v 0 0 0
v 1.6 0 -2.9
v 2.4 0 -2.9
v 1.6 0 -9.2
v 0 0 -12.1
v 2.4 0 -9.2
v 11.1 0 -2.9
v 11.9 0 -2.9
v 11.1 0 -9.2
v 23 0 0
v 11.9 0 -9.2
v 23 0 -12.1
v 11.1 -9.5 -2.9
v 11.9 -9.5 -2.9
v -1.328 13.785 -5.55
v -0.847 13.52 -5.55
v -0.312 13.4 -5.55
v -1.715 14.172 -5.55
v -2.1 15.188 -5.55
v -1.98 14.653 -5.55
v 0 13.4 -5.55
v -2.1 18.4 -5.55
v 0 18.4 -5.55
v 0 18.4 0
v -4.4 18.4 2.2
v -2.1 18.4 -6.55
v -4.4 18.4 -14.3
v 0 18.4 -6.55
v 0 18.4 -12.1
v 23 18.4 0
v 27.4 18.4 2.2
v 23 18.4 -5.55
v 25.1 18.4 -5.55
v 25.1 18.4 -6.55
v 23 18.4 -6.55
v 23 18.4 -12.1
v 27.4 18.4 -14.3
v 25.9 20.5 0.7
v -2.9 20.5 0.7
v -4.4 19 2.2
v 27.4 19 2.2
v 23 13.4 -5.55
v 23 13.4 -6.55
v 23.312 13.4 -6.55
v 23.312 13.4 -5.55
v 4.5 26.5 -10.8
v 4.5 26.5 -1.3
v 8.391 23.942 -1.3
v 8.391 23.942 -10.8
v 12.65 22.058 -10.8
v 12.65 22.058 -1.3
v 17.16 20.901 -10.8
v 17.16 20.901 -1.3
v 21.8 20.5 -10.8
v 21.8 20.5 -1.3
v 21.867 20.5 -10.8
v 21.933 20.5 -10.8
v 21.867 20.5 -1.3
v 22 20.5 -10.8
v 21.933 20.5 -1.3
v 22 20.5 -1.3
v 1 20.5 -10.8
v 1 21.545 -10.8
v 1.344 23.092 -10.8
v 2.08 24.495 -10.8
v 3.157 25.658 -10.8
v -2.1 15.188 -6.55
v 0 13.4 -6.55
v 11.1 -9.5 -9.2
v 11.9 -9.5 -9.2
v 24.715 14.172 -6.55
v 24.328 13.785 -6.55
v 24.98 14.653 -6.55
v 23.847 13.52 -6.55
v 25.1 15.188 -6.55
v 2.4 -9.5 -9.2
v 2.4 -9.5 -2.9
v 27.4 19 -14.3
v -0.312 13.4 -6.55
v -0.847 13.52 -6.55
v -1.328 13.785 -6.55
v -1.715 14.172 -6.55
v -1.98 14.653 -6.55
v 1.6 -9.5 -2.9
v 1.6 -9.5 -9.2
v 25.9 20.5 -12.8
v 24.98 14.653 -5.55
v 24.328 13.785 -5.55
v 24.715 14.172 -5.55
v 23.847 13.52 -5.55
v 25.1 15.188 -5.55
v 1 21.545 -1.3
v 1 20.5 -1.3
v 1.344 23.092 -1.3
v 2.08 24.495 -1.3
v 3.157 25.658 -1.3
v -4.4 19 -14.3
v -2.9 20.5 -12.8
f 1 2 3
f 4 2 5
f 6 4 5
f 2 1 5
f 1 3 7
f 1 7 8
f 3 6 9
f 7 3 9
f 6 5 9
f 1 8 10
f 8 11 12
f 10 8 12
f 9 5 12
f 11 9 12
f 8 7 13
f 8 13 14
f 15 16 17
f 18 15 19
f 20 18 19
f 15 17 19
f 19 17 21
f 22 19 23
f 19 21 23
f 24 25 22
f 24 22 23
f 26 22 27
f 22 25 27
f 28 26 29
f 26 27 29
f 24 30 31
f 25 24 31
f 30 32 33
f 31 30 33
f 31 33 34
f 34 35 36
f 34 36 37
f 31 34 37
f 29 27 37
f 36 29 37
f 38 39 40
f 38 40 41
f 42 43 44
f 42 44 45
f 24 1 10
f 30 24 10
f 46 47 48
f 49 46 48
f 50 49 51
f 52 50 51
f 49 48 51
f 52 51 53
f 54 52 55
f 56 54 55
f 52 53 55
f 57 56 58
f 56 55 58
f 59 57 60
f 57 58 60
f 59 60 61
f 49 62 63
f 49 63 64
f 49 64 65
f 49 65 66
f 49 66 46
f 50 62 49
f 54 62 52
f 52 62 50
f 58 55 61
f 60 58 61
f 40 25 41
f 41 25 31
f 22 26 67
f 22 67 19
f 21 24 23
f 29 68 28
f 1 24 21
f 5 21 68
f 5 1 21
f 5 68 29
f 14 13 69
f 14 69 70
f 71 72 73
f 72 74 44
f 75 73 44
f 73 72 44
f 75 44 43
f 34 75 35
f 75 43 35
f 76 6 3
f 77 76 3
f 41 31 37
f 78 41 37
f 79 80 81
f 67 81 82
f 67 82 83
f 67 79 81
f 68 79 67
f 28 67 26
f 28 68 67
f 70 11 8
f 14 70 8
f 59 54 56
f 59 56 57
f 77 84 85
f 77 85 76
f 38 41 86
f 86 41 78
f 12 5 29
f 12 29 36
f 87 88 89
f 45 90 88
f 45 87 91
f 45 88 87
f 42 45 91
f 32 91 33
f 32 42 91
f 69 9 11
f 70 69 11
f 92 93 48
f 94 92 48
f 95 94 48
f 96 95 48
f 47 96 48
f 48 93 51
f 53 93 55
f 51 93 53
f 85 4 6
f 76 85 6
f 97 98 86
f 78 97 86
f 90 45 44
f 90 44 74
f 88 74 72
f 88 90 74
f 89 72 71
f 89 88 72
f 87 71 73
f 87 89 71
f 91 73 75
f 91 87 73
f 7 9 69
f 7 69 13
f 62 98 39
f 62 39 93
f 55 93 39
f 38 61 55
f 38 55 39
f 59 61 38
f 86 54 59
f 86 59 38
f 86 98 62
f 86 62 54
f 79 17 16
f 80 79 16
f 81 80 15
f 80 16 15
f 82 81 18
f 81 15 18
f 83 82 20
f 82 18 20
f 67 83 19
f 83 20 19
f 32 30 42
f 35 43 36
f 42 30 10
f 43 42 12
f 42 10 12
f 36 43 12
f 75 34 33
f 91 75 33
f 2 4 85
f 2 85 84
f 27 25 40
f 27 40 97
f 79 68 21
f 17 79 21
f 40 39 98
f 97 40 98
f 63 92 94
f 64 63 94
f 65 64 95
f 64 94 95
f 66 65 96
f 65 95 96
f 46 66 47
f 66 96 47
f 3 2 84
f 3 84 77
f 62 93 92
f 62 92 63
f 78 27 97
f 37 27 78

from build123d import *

# Parameters (mm, degrees)
SKETCH1_W           = 23
SKETCH1_H           = 12.1
BOSS_EXTRUDE1_DEPTH = 18.4
SKETCH2_W           = 0.8
SKETCH2_H           = 6.3
BOSS_EXTRUDE2_DEPTH = 9.5
SKETCH3_W           = 31.8
SKETCH3_H           = 16.5
BOSS_EXTRUDE3_DEPTH = 2.1
CHAMFER1_SIZE       = 1.5
SKETCH4_W           = 1
SKETCH4_H           = 5
BOSS_EXTRUDE4_DEPTH = 2.1
CUT_EXTRUDE1_DEPTH  = 1
SKETCH7_W           = 21
SKETCH7_H           = 9.5
BOSS_EXTRUDE5_DEPTH = 6
CUT_EXTRUDE3_DEPTH  = 9.5


with BuildPart() as part:
    # Sketch1 → Boss-Extrude1 (new body)
    with BuildSketch(Plane(origin=(0, 0, 0), x_dir=(1, 0, 0), z_dir=(0, 1, 0))):
        with Locations((11.5, 6.05)):
            Rectangle(SKETCH1_W, SKETCH1_H)
    extrude(amount=BOSS_EXTRUDE1_DEPTH)

    # Sketch2 → Boss-Extrude2 (add)
    with BuildSketch(Plane.XZ):
        with Locations((2, -6.05)):
            Rectangle(SKETCH2_W, SKETCH2_H)
        with Locations((11.5, -6.05)):
            Rectangle(SKETCH2_W, SKETCH2_H)
    extrude(amount=BOSS_EXTRUDE2_DEPTH)

    # Sketch3 → Boss-Extrude3 (add)
    with BuildSketch(Plane(origin=(0, 18.4, 0), x_dir=(1, 0, 0), z_dir=(0, 1, 0))):
        with Locations((11.5, 6.05)):
            Rectangle(SKETCH3_W, SKETCH3_H)
    extrude(amount=BOSS_EXTRUDE3_DEPTH)

    # Chamfer1
    chamfer1_edges = [part.edges().sort_by_distance(p)[0] for p in [
        (-4.4, 20.5, -6.05),
        (11.5, 20.5, 2.2),
        (27.4, 20.5, -6.05),
        (11.5, 20.5, -14.3),
    ]]
    chamfer(chamfer1_edges, length=CHAMFER1_SIZE)

    # Sketch4 → Boss-Extrude4 (add)
    with BuildSketch(Plane.ZY):
        with Locations((-6.05, 15.9)):
            Rectangle(SKETCH4_W, SKETCH4_H)
    boss_extrude4 = extrude(amount=BOSS_EXTRUDE4_DEPTH)

    # Sketch5 → Cut-Extrude1 (cut)
    with BuildSketch(Plane.XY.offset(-5.55)):
        with BuildLine():
            ThreePointArc((-0.312308302, 13.4), (-1.535088668, 13.964911332), (-2.1, 15.187691698))
            Line((-2.1, 15.187691698), (-2.1, 13.4))
            Line((-2.1, 13.4), (-0.312308302, 13.4))
        make_face()
    cut_extrude1 = extrude(amount=-CUT_EXTRUDE1_DEPTH, mode=Mode.SUBTRACT)

    # Mirror2: Boss-Extrude4 across plane
    add(boss_extrude4.mirror(Plane.ZY.offset(-11.5)))

    # Mirror3: Cut-Extrude1 across plane
    add(cut_extrude1.mirror(Plane.ZY.offset(-11.5)), mode=Mode.SUBTRACT)

    # Sketch7 → Boss-Extrude5 (add)
    with BuildSketch(Plane(origin=(0, 20.5, 0), x_dir=(1, 0, 0), z_dir=(0, 1, 0))):
        with Locations((11.5, 6.05)):
            Rectangle(SKETCH7_W, SKETCH7_H)
    extrude(amount=BOSS_EXTRUDE5_DEPTH)

    # Sketch8 → Cut-Extrude3 (cut)
    with BuildSketch(Plane.XY.offset(-1.3)):
        with BuildLine():
            ThreePointArc((1, 21.544517728), (2.080144811, 24.495369861), (4.5, 26.5))
            Line((4.5, 26.5), (1, 26.5))
            Line((1, 26.5), (1, 21.544517728))
        make_face()
        with BuildLine():
            Line((1, 20.5), (1, 21.544517728))
            ThreePointArc((1, 21.544517728), (0.977304154, 21.022258864), (1, 20.5))
        make_face()
        with BuildLine():
            Line((22, 26.5), (4.5, 26.5))
            ThreePointArc((4.5, 26.5), (12.74453051, 22.025713988), (22, 20.5))
            Line((22, 20.5), (22, 26.5))
        make_face()
    extrude(amount=-CUT_EXTRUDE3_DEPTH, mode=Mode.SUBTRACT)


solid = part.part
